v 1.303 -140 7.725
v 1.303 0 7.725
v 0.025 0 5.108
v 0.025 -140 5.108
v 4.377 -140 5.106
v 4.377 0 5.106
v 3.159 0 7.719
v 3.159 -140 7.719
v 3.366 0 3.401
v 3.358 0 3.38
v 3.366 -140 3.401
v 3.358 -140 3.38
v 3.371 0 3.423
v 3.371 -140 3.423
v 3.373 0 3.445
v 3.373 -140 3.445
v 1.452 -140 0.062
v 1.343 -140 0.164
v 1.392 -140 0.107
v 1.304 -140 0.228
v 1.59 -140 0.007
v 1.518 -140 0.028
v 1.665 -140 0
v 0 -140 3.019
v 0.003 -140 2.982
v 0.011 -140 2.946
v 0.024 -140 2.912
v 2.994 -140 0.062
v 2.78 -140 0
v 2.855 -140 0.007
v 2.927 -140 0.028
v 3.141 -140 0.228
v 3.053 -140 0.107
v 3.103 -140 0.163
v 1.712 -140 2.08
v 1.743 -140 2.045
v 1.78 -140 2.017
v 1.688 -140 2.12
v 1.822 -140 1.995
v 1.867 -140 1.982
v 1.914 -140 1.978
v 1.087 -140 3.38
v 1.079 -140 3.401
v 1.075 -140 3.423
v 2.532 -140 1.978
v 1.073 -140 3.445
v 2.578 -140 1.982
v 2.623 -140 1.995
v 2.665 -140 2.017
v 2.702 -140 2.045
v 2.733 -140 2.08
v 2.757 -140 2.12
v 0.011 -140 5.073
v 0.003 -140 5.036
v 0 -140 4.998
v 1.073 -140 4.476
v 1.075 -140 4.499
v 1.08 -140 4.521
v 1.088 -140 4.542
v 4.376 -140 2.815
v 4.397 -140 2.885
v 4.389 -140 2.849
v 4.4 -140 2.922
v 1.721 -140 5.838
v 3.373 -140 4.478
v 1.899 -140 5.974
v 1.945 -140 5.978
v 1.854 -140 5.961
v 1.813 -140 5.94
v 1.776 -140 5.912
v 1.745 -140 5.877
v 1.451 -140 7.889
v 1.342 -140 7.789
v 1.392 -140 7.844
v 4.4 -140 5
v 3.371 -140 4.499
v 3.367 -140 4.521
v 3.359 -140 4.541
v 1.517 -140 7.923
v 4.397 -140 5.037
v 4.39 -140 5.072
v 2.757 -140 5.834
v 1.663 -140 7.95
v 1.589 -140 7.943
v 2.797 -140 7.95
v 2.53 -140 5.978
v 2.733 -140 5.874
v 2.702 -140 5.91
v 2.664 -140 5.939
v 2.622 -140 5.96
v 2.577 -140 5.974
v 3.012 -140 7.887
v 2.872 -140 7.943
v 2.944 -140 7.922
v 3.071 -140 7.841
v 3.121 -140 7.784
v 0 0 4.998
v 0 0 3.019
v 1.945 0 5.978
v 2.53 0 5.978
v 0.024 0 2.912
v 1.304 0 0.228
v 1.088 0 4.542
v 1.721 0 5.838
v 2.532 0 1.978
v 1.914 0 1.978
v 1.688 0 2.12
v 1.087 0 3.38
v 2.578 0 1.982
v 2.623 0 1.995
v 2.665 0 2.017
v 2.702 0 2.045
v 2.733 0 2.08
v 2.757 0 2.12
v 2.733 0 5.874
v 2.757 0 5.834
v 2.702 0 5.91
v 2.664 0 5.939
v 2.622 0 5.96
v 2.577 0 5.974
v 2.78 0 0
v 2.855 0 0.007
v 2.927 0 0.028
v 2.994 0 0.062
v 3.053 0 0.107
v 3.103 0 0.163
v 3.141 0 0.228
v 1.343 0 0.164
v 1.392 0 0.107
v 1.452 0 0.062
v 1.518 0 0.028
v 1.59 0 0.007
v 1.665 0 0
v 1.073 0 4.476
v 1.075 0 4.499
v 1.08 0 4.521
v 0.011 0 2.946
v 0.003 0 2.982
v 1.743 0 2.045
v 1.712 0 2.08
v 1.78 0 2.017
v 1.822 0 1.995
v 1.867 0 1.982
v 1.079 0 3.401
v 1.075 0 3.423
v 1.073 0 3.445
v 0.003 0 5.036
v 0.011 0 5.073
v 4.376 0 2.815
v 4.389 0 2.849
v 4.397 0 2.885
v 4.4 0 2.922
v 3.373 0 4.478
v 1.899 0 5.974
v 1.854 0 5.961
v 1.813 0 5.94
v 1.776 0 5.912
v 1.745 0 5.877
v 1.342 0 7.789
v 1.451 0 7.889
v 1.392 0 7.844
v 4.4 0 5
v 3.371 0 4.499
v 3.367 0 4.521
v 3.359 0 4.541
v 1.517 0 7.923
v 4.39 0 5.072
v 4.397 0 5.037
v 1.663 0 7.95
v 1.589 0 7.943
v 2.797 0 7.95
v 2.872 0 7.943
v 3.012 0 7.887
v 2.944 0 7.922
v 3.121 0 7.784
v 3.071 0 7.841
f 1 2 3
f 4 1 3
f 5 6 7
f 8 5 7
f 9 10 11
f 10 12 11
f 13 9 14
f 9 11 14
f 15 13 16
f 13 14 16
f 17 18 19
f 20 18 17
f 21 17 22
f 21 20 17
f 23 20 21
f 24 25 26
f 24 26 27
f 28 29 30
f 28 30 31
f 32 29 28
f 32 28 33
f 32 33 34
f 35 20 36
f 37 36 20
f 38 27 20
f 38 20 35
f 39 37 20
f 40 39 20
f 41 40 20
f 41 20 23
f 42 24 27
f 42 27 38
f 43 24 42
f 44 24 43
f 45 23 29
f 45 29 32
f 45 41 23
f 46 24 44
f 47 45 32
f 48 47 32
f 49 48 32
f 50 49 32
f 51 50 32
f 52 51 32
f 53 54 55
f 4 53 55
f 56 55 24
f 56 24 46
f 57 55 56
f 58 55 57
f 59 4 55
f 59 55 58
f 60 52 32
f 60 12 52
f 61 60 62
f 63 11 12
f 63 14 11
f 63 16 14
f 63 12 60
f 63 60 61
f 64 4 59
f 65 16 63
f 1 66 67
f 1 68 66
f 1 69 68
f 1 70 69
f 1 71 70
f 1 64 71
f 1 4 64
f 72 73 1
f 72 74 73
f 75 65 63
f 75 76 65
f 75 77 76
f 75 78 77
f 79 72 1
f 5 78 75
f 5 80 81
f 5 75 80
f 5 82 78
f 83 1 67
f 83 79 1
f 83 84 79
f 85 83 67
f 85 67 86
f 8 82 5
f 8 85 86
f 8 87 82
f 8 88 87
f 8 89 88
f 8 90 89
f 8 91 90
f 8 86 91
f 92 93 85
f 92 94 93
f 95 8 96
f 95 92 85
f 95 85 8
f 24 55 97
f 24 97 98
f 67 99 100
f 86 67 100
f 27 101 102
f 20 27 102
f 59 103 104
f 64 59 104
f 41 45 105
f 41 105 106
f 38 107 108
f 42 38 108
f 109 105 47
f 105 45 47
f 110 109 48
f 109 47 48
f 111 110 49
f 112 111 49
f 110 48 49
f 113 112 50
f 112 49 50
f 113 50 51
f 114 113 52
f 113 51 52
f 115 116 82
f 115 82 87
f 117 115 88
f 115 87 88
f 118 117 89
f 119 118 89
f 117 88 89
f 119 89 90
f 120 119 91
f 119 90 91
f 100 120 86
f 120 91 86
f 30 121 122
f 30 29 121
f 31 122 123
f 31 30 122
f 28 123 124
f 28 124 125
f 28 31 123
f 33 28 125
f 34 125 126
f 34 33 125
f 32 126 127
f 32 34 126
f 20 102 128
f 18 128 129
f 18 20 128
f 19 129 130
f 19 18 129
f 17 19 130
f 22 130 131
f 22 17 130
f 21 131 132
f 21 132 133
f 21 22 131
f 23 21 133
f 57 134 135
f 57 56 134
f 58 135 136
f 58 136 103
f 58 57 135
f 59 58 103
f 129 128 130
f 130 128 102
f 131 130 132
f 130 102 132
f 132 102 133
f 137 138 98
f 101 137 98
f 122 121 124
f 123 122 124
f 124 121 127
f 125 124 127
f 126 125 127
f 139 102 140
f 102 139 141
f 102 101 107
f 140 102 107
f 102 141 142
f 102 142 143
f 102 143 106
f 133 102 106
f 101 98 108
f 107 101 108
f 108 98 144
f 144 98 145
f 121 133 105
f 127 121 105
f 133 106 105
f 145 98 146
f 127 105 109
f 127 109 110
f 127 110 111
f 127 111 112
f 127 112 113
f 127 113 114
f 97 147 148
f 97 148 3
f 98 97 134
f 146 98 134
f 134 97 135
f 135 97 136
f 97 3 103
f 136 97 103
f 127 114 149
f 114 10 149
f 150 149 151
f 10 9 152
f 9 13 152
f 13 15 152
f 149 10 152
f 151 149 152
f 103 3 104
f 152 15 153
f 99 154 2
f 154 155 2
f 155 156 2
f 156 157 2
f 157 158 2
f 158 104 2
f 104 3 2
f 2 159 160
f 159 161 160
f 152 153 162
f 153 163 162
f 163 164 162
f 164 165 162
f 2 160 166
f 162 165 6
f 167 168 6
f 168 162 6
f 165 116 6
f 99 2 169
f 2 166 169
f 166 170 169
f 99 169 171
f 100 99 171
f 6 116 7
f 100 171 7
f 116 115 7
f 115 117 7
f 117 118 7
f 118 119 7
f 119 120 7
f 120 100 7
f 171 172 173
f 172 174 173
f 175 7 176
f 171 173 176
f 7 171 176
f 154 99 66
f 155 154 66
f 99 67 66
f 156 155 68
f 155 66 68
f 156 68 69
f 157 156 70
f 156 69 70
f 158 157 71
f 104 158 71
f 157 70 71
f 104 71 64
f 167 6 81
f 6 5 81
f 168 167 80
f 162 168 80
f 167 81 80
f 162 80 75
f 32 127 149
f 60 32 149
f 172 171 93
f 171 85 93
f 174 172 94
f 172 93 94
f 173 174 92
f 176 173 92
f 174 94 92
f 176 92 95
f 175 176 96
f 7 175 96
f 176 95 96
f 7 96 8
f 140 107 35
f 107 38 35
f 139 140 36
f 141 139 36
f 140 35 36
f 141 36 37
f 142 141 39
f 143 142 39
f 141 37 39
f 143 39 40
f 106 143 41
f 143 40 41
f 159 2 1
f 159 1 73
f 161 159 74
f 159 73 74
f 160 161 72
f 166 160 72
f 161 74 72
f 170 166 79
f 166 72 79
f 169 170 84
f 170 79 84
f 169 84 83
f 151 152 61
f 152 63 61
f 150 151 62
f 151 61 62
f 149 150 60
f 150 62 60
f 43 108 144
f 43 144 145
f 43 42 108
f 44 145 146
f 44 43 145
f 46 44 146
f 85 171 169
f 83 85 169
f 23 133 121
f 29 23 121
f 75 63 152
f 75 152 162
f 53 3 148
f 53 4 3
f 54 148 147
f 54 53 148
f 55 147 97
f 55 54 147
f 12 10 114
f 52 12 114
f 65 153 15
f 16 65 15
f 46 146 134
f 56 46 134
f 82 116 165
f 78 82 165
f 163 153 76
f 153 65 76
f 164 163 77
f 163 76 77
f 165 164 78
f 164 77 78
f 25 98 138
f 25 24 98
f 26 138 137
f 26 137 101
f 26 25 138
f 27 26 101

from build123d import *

# Parameters (mm, degrees)
F1_DEPTH = 140
F2_R     = 0.4
F3_R     = 0.25
F4_R     = 0.15


with BuildPart() as f1:
    # F0 (on Front) → F1 (new body)
    with BuildSketch(Plane.XZ):
        Polygon((1.4127, 7.95), (0, 5.055815), (0, 2.962603), (1.4127, 0), (3.0327, 0), (4.4, 2.865815), (4.4, 5.055815), (3.051512, 7.95), align=None)
        Polygon((1.072888, 3.410815), (1.072888, 4.510815), (1.789046, 5.978), (2.689283, 5.978), (3.372888, 4.510815), (3.372888, 3.410815), (2.689283, 1.978), (1.756118, 1.978), align=None, mode=Mode.SUBTRACT)
    extrude(amount=F1_DEPTH)

    # F2
    f2_edges = [f1.edges().sort_by_distance(p)[0] for p in [
        (3.051512, -70, 7.95),
        (1.4127, -70, 7.95),
        (3.0327, -70, 0),
        (1.4127, -70, 0),
    ]]
    fillet(f2_edges, radius=F2_R)

    # F3
    f3_edges = [f1.edges().sort_by_distance(p)[0] for p in [
        (4.4, -70, 5.055815),
        (4.4, -70, 2.865815),
        (0, -70, 5.055815),
        (0, -70, 2.962603),
        (1.756118, -70, 1.978),
        (1.789046, -70, 5.978),
        (2.689283, -70, 5.978),
        (2.689283, -70, 1.978),
    ]]
    fillet(f3_edges, radius=F3_R)

    # F4
    f4_edges = [f1.edges().sort_by_distance(p)[0] for p in [
        (1.072888, -70, 4.510815),
        (1.072888, -70, 3.410815),
        (3.372888, -70, 4.510815),
        (3.372888, -70, 3.410815),
    ]]
    fillet(f4_edges, radius=F4_R)


solid = f1.part
